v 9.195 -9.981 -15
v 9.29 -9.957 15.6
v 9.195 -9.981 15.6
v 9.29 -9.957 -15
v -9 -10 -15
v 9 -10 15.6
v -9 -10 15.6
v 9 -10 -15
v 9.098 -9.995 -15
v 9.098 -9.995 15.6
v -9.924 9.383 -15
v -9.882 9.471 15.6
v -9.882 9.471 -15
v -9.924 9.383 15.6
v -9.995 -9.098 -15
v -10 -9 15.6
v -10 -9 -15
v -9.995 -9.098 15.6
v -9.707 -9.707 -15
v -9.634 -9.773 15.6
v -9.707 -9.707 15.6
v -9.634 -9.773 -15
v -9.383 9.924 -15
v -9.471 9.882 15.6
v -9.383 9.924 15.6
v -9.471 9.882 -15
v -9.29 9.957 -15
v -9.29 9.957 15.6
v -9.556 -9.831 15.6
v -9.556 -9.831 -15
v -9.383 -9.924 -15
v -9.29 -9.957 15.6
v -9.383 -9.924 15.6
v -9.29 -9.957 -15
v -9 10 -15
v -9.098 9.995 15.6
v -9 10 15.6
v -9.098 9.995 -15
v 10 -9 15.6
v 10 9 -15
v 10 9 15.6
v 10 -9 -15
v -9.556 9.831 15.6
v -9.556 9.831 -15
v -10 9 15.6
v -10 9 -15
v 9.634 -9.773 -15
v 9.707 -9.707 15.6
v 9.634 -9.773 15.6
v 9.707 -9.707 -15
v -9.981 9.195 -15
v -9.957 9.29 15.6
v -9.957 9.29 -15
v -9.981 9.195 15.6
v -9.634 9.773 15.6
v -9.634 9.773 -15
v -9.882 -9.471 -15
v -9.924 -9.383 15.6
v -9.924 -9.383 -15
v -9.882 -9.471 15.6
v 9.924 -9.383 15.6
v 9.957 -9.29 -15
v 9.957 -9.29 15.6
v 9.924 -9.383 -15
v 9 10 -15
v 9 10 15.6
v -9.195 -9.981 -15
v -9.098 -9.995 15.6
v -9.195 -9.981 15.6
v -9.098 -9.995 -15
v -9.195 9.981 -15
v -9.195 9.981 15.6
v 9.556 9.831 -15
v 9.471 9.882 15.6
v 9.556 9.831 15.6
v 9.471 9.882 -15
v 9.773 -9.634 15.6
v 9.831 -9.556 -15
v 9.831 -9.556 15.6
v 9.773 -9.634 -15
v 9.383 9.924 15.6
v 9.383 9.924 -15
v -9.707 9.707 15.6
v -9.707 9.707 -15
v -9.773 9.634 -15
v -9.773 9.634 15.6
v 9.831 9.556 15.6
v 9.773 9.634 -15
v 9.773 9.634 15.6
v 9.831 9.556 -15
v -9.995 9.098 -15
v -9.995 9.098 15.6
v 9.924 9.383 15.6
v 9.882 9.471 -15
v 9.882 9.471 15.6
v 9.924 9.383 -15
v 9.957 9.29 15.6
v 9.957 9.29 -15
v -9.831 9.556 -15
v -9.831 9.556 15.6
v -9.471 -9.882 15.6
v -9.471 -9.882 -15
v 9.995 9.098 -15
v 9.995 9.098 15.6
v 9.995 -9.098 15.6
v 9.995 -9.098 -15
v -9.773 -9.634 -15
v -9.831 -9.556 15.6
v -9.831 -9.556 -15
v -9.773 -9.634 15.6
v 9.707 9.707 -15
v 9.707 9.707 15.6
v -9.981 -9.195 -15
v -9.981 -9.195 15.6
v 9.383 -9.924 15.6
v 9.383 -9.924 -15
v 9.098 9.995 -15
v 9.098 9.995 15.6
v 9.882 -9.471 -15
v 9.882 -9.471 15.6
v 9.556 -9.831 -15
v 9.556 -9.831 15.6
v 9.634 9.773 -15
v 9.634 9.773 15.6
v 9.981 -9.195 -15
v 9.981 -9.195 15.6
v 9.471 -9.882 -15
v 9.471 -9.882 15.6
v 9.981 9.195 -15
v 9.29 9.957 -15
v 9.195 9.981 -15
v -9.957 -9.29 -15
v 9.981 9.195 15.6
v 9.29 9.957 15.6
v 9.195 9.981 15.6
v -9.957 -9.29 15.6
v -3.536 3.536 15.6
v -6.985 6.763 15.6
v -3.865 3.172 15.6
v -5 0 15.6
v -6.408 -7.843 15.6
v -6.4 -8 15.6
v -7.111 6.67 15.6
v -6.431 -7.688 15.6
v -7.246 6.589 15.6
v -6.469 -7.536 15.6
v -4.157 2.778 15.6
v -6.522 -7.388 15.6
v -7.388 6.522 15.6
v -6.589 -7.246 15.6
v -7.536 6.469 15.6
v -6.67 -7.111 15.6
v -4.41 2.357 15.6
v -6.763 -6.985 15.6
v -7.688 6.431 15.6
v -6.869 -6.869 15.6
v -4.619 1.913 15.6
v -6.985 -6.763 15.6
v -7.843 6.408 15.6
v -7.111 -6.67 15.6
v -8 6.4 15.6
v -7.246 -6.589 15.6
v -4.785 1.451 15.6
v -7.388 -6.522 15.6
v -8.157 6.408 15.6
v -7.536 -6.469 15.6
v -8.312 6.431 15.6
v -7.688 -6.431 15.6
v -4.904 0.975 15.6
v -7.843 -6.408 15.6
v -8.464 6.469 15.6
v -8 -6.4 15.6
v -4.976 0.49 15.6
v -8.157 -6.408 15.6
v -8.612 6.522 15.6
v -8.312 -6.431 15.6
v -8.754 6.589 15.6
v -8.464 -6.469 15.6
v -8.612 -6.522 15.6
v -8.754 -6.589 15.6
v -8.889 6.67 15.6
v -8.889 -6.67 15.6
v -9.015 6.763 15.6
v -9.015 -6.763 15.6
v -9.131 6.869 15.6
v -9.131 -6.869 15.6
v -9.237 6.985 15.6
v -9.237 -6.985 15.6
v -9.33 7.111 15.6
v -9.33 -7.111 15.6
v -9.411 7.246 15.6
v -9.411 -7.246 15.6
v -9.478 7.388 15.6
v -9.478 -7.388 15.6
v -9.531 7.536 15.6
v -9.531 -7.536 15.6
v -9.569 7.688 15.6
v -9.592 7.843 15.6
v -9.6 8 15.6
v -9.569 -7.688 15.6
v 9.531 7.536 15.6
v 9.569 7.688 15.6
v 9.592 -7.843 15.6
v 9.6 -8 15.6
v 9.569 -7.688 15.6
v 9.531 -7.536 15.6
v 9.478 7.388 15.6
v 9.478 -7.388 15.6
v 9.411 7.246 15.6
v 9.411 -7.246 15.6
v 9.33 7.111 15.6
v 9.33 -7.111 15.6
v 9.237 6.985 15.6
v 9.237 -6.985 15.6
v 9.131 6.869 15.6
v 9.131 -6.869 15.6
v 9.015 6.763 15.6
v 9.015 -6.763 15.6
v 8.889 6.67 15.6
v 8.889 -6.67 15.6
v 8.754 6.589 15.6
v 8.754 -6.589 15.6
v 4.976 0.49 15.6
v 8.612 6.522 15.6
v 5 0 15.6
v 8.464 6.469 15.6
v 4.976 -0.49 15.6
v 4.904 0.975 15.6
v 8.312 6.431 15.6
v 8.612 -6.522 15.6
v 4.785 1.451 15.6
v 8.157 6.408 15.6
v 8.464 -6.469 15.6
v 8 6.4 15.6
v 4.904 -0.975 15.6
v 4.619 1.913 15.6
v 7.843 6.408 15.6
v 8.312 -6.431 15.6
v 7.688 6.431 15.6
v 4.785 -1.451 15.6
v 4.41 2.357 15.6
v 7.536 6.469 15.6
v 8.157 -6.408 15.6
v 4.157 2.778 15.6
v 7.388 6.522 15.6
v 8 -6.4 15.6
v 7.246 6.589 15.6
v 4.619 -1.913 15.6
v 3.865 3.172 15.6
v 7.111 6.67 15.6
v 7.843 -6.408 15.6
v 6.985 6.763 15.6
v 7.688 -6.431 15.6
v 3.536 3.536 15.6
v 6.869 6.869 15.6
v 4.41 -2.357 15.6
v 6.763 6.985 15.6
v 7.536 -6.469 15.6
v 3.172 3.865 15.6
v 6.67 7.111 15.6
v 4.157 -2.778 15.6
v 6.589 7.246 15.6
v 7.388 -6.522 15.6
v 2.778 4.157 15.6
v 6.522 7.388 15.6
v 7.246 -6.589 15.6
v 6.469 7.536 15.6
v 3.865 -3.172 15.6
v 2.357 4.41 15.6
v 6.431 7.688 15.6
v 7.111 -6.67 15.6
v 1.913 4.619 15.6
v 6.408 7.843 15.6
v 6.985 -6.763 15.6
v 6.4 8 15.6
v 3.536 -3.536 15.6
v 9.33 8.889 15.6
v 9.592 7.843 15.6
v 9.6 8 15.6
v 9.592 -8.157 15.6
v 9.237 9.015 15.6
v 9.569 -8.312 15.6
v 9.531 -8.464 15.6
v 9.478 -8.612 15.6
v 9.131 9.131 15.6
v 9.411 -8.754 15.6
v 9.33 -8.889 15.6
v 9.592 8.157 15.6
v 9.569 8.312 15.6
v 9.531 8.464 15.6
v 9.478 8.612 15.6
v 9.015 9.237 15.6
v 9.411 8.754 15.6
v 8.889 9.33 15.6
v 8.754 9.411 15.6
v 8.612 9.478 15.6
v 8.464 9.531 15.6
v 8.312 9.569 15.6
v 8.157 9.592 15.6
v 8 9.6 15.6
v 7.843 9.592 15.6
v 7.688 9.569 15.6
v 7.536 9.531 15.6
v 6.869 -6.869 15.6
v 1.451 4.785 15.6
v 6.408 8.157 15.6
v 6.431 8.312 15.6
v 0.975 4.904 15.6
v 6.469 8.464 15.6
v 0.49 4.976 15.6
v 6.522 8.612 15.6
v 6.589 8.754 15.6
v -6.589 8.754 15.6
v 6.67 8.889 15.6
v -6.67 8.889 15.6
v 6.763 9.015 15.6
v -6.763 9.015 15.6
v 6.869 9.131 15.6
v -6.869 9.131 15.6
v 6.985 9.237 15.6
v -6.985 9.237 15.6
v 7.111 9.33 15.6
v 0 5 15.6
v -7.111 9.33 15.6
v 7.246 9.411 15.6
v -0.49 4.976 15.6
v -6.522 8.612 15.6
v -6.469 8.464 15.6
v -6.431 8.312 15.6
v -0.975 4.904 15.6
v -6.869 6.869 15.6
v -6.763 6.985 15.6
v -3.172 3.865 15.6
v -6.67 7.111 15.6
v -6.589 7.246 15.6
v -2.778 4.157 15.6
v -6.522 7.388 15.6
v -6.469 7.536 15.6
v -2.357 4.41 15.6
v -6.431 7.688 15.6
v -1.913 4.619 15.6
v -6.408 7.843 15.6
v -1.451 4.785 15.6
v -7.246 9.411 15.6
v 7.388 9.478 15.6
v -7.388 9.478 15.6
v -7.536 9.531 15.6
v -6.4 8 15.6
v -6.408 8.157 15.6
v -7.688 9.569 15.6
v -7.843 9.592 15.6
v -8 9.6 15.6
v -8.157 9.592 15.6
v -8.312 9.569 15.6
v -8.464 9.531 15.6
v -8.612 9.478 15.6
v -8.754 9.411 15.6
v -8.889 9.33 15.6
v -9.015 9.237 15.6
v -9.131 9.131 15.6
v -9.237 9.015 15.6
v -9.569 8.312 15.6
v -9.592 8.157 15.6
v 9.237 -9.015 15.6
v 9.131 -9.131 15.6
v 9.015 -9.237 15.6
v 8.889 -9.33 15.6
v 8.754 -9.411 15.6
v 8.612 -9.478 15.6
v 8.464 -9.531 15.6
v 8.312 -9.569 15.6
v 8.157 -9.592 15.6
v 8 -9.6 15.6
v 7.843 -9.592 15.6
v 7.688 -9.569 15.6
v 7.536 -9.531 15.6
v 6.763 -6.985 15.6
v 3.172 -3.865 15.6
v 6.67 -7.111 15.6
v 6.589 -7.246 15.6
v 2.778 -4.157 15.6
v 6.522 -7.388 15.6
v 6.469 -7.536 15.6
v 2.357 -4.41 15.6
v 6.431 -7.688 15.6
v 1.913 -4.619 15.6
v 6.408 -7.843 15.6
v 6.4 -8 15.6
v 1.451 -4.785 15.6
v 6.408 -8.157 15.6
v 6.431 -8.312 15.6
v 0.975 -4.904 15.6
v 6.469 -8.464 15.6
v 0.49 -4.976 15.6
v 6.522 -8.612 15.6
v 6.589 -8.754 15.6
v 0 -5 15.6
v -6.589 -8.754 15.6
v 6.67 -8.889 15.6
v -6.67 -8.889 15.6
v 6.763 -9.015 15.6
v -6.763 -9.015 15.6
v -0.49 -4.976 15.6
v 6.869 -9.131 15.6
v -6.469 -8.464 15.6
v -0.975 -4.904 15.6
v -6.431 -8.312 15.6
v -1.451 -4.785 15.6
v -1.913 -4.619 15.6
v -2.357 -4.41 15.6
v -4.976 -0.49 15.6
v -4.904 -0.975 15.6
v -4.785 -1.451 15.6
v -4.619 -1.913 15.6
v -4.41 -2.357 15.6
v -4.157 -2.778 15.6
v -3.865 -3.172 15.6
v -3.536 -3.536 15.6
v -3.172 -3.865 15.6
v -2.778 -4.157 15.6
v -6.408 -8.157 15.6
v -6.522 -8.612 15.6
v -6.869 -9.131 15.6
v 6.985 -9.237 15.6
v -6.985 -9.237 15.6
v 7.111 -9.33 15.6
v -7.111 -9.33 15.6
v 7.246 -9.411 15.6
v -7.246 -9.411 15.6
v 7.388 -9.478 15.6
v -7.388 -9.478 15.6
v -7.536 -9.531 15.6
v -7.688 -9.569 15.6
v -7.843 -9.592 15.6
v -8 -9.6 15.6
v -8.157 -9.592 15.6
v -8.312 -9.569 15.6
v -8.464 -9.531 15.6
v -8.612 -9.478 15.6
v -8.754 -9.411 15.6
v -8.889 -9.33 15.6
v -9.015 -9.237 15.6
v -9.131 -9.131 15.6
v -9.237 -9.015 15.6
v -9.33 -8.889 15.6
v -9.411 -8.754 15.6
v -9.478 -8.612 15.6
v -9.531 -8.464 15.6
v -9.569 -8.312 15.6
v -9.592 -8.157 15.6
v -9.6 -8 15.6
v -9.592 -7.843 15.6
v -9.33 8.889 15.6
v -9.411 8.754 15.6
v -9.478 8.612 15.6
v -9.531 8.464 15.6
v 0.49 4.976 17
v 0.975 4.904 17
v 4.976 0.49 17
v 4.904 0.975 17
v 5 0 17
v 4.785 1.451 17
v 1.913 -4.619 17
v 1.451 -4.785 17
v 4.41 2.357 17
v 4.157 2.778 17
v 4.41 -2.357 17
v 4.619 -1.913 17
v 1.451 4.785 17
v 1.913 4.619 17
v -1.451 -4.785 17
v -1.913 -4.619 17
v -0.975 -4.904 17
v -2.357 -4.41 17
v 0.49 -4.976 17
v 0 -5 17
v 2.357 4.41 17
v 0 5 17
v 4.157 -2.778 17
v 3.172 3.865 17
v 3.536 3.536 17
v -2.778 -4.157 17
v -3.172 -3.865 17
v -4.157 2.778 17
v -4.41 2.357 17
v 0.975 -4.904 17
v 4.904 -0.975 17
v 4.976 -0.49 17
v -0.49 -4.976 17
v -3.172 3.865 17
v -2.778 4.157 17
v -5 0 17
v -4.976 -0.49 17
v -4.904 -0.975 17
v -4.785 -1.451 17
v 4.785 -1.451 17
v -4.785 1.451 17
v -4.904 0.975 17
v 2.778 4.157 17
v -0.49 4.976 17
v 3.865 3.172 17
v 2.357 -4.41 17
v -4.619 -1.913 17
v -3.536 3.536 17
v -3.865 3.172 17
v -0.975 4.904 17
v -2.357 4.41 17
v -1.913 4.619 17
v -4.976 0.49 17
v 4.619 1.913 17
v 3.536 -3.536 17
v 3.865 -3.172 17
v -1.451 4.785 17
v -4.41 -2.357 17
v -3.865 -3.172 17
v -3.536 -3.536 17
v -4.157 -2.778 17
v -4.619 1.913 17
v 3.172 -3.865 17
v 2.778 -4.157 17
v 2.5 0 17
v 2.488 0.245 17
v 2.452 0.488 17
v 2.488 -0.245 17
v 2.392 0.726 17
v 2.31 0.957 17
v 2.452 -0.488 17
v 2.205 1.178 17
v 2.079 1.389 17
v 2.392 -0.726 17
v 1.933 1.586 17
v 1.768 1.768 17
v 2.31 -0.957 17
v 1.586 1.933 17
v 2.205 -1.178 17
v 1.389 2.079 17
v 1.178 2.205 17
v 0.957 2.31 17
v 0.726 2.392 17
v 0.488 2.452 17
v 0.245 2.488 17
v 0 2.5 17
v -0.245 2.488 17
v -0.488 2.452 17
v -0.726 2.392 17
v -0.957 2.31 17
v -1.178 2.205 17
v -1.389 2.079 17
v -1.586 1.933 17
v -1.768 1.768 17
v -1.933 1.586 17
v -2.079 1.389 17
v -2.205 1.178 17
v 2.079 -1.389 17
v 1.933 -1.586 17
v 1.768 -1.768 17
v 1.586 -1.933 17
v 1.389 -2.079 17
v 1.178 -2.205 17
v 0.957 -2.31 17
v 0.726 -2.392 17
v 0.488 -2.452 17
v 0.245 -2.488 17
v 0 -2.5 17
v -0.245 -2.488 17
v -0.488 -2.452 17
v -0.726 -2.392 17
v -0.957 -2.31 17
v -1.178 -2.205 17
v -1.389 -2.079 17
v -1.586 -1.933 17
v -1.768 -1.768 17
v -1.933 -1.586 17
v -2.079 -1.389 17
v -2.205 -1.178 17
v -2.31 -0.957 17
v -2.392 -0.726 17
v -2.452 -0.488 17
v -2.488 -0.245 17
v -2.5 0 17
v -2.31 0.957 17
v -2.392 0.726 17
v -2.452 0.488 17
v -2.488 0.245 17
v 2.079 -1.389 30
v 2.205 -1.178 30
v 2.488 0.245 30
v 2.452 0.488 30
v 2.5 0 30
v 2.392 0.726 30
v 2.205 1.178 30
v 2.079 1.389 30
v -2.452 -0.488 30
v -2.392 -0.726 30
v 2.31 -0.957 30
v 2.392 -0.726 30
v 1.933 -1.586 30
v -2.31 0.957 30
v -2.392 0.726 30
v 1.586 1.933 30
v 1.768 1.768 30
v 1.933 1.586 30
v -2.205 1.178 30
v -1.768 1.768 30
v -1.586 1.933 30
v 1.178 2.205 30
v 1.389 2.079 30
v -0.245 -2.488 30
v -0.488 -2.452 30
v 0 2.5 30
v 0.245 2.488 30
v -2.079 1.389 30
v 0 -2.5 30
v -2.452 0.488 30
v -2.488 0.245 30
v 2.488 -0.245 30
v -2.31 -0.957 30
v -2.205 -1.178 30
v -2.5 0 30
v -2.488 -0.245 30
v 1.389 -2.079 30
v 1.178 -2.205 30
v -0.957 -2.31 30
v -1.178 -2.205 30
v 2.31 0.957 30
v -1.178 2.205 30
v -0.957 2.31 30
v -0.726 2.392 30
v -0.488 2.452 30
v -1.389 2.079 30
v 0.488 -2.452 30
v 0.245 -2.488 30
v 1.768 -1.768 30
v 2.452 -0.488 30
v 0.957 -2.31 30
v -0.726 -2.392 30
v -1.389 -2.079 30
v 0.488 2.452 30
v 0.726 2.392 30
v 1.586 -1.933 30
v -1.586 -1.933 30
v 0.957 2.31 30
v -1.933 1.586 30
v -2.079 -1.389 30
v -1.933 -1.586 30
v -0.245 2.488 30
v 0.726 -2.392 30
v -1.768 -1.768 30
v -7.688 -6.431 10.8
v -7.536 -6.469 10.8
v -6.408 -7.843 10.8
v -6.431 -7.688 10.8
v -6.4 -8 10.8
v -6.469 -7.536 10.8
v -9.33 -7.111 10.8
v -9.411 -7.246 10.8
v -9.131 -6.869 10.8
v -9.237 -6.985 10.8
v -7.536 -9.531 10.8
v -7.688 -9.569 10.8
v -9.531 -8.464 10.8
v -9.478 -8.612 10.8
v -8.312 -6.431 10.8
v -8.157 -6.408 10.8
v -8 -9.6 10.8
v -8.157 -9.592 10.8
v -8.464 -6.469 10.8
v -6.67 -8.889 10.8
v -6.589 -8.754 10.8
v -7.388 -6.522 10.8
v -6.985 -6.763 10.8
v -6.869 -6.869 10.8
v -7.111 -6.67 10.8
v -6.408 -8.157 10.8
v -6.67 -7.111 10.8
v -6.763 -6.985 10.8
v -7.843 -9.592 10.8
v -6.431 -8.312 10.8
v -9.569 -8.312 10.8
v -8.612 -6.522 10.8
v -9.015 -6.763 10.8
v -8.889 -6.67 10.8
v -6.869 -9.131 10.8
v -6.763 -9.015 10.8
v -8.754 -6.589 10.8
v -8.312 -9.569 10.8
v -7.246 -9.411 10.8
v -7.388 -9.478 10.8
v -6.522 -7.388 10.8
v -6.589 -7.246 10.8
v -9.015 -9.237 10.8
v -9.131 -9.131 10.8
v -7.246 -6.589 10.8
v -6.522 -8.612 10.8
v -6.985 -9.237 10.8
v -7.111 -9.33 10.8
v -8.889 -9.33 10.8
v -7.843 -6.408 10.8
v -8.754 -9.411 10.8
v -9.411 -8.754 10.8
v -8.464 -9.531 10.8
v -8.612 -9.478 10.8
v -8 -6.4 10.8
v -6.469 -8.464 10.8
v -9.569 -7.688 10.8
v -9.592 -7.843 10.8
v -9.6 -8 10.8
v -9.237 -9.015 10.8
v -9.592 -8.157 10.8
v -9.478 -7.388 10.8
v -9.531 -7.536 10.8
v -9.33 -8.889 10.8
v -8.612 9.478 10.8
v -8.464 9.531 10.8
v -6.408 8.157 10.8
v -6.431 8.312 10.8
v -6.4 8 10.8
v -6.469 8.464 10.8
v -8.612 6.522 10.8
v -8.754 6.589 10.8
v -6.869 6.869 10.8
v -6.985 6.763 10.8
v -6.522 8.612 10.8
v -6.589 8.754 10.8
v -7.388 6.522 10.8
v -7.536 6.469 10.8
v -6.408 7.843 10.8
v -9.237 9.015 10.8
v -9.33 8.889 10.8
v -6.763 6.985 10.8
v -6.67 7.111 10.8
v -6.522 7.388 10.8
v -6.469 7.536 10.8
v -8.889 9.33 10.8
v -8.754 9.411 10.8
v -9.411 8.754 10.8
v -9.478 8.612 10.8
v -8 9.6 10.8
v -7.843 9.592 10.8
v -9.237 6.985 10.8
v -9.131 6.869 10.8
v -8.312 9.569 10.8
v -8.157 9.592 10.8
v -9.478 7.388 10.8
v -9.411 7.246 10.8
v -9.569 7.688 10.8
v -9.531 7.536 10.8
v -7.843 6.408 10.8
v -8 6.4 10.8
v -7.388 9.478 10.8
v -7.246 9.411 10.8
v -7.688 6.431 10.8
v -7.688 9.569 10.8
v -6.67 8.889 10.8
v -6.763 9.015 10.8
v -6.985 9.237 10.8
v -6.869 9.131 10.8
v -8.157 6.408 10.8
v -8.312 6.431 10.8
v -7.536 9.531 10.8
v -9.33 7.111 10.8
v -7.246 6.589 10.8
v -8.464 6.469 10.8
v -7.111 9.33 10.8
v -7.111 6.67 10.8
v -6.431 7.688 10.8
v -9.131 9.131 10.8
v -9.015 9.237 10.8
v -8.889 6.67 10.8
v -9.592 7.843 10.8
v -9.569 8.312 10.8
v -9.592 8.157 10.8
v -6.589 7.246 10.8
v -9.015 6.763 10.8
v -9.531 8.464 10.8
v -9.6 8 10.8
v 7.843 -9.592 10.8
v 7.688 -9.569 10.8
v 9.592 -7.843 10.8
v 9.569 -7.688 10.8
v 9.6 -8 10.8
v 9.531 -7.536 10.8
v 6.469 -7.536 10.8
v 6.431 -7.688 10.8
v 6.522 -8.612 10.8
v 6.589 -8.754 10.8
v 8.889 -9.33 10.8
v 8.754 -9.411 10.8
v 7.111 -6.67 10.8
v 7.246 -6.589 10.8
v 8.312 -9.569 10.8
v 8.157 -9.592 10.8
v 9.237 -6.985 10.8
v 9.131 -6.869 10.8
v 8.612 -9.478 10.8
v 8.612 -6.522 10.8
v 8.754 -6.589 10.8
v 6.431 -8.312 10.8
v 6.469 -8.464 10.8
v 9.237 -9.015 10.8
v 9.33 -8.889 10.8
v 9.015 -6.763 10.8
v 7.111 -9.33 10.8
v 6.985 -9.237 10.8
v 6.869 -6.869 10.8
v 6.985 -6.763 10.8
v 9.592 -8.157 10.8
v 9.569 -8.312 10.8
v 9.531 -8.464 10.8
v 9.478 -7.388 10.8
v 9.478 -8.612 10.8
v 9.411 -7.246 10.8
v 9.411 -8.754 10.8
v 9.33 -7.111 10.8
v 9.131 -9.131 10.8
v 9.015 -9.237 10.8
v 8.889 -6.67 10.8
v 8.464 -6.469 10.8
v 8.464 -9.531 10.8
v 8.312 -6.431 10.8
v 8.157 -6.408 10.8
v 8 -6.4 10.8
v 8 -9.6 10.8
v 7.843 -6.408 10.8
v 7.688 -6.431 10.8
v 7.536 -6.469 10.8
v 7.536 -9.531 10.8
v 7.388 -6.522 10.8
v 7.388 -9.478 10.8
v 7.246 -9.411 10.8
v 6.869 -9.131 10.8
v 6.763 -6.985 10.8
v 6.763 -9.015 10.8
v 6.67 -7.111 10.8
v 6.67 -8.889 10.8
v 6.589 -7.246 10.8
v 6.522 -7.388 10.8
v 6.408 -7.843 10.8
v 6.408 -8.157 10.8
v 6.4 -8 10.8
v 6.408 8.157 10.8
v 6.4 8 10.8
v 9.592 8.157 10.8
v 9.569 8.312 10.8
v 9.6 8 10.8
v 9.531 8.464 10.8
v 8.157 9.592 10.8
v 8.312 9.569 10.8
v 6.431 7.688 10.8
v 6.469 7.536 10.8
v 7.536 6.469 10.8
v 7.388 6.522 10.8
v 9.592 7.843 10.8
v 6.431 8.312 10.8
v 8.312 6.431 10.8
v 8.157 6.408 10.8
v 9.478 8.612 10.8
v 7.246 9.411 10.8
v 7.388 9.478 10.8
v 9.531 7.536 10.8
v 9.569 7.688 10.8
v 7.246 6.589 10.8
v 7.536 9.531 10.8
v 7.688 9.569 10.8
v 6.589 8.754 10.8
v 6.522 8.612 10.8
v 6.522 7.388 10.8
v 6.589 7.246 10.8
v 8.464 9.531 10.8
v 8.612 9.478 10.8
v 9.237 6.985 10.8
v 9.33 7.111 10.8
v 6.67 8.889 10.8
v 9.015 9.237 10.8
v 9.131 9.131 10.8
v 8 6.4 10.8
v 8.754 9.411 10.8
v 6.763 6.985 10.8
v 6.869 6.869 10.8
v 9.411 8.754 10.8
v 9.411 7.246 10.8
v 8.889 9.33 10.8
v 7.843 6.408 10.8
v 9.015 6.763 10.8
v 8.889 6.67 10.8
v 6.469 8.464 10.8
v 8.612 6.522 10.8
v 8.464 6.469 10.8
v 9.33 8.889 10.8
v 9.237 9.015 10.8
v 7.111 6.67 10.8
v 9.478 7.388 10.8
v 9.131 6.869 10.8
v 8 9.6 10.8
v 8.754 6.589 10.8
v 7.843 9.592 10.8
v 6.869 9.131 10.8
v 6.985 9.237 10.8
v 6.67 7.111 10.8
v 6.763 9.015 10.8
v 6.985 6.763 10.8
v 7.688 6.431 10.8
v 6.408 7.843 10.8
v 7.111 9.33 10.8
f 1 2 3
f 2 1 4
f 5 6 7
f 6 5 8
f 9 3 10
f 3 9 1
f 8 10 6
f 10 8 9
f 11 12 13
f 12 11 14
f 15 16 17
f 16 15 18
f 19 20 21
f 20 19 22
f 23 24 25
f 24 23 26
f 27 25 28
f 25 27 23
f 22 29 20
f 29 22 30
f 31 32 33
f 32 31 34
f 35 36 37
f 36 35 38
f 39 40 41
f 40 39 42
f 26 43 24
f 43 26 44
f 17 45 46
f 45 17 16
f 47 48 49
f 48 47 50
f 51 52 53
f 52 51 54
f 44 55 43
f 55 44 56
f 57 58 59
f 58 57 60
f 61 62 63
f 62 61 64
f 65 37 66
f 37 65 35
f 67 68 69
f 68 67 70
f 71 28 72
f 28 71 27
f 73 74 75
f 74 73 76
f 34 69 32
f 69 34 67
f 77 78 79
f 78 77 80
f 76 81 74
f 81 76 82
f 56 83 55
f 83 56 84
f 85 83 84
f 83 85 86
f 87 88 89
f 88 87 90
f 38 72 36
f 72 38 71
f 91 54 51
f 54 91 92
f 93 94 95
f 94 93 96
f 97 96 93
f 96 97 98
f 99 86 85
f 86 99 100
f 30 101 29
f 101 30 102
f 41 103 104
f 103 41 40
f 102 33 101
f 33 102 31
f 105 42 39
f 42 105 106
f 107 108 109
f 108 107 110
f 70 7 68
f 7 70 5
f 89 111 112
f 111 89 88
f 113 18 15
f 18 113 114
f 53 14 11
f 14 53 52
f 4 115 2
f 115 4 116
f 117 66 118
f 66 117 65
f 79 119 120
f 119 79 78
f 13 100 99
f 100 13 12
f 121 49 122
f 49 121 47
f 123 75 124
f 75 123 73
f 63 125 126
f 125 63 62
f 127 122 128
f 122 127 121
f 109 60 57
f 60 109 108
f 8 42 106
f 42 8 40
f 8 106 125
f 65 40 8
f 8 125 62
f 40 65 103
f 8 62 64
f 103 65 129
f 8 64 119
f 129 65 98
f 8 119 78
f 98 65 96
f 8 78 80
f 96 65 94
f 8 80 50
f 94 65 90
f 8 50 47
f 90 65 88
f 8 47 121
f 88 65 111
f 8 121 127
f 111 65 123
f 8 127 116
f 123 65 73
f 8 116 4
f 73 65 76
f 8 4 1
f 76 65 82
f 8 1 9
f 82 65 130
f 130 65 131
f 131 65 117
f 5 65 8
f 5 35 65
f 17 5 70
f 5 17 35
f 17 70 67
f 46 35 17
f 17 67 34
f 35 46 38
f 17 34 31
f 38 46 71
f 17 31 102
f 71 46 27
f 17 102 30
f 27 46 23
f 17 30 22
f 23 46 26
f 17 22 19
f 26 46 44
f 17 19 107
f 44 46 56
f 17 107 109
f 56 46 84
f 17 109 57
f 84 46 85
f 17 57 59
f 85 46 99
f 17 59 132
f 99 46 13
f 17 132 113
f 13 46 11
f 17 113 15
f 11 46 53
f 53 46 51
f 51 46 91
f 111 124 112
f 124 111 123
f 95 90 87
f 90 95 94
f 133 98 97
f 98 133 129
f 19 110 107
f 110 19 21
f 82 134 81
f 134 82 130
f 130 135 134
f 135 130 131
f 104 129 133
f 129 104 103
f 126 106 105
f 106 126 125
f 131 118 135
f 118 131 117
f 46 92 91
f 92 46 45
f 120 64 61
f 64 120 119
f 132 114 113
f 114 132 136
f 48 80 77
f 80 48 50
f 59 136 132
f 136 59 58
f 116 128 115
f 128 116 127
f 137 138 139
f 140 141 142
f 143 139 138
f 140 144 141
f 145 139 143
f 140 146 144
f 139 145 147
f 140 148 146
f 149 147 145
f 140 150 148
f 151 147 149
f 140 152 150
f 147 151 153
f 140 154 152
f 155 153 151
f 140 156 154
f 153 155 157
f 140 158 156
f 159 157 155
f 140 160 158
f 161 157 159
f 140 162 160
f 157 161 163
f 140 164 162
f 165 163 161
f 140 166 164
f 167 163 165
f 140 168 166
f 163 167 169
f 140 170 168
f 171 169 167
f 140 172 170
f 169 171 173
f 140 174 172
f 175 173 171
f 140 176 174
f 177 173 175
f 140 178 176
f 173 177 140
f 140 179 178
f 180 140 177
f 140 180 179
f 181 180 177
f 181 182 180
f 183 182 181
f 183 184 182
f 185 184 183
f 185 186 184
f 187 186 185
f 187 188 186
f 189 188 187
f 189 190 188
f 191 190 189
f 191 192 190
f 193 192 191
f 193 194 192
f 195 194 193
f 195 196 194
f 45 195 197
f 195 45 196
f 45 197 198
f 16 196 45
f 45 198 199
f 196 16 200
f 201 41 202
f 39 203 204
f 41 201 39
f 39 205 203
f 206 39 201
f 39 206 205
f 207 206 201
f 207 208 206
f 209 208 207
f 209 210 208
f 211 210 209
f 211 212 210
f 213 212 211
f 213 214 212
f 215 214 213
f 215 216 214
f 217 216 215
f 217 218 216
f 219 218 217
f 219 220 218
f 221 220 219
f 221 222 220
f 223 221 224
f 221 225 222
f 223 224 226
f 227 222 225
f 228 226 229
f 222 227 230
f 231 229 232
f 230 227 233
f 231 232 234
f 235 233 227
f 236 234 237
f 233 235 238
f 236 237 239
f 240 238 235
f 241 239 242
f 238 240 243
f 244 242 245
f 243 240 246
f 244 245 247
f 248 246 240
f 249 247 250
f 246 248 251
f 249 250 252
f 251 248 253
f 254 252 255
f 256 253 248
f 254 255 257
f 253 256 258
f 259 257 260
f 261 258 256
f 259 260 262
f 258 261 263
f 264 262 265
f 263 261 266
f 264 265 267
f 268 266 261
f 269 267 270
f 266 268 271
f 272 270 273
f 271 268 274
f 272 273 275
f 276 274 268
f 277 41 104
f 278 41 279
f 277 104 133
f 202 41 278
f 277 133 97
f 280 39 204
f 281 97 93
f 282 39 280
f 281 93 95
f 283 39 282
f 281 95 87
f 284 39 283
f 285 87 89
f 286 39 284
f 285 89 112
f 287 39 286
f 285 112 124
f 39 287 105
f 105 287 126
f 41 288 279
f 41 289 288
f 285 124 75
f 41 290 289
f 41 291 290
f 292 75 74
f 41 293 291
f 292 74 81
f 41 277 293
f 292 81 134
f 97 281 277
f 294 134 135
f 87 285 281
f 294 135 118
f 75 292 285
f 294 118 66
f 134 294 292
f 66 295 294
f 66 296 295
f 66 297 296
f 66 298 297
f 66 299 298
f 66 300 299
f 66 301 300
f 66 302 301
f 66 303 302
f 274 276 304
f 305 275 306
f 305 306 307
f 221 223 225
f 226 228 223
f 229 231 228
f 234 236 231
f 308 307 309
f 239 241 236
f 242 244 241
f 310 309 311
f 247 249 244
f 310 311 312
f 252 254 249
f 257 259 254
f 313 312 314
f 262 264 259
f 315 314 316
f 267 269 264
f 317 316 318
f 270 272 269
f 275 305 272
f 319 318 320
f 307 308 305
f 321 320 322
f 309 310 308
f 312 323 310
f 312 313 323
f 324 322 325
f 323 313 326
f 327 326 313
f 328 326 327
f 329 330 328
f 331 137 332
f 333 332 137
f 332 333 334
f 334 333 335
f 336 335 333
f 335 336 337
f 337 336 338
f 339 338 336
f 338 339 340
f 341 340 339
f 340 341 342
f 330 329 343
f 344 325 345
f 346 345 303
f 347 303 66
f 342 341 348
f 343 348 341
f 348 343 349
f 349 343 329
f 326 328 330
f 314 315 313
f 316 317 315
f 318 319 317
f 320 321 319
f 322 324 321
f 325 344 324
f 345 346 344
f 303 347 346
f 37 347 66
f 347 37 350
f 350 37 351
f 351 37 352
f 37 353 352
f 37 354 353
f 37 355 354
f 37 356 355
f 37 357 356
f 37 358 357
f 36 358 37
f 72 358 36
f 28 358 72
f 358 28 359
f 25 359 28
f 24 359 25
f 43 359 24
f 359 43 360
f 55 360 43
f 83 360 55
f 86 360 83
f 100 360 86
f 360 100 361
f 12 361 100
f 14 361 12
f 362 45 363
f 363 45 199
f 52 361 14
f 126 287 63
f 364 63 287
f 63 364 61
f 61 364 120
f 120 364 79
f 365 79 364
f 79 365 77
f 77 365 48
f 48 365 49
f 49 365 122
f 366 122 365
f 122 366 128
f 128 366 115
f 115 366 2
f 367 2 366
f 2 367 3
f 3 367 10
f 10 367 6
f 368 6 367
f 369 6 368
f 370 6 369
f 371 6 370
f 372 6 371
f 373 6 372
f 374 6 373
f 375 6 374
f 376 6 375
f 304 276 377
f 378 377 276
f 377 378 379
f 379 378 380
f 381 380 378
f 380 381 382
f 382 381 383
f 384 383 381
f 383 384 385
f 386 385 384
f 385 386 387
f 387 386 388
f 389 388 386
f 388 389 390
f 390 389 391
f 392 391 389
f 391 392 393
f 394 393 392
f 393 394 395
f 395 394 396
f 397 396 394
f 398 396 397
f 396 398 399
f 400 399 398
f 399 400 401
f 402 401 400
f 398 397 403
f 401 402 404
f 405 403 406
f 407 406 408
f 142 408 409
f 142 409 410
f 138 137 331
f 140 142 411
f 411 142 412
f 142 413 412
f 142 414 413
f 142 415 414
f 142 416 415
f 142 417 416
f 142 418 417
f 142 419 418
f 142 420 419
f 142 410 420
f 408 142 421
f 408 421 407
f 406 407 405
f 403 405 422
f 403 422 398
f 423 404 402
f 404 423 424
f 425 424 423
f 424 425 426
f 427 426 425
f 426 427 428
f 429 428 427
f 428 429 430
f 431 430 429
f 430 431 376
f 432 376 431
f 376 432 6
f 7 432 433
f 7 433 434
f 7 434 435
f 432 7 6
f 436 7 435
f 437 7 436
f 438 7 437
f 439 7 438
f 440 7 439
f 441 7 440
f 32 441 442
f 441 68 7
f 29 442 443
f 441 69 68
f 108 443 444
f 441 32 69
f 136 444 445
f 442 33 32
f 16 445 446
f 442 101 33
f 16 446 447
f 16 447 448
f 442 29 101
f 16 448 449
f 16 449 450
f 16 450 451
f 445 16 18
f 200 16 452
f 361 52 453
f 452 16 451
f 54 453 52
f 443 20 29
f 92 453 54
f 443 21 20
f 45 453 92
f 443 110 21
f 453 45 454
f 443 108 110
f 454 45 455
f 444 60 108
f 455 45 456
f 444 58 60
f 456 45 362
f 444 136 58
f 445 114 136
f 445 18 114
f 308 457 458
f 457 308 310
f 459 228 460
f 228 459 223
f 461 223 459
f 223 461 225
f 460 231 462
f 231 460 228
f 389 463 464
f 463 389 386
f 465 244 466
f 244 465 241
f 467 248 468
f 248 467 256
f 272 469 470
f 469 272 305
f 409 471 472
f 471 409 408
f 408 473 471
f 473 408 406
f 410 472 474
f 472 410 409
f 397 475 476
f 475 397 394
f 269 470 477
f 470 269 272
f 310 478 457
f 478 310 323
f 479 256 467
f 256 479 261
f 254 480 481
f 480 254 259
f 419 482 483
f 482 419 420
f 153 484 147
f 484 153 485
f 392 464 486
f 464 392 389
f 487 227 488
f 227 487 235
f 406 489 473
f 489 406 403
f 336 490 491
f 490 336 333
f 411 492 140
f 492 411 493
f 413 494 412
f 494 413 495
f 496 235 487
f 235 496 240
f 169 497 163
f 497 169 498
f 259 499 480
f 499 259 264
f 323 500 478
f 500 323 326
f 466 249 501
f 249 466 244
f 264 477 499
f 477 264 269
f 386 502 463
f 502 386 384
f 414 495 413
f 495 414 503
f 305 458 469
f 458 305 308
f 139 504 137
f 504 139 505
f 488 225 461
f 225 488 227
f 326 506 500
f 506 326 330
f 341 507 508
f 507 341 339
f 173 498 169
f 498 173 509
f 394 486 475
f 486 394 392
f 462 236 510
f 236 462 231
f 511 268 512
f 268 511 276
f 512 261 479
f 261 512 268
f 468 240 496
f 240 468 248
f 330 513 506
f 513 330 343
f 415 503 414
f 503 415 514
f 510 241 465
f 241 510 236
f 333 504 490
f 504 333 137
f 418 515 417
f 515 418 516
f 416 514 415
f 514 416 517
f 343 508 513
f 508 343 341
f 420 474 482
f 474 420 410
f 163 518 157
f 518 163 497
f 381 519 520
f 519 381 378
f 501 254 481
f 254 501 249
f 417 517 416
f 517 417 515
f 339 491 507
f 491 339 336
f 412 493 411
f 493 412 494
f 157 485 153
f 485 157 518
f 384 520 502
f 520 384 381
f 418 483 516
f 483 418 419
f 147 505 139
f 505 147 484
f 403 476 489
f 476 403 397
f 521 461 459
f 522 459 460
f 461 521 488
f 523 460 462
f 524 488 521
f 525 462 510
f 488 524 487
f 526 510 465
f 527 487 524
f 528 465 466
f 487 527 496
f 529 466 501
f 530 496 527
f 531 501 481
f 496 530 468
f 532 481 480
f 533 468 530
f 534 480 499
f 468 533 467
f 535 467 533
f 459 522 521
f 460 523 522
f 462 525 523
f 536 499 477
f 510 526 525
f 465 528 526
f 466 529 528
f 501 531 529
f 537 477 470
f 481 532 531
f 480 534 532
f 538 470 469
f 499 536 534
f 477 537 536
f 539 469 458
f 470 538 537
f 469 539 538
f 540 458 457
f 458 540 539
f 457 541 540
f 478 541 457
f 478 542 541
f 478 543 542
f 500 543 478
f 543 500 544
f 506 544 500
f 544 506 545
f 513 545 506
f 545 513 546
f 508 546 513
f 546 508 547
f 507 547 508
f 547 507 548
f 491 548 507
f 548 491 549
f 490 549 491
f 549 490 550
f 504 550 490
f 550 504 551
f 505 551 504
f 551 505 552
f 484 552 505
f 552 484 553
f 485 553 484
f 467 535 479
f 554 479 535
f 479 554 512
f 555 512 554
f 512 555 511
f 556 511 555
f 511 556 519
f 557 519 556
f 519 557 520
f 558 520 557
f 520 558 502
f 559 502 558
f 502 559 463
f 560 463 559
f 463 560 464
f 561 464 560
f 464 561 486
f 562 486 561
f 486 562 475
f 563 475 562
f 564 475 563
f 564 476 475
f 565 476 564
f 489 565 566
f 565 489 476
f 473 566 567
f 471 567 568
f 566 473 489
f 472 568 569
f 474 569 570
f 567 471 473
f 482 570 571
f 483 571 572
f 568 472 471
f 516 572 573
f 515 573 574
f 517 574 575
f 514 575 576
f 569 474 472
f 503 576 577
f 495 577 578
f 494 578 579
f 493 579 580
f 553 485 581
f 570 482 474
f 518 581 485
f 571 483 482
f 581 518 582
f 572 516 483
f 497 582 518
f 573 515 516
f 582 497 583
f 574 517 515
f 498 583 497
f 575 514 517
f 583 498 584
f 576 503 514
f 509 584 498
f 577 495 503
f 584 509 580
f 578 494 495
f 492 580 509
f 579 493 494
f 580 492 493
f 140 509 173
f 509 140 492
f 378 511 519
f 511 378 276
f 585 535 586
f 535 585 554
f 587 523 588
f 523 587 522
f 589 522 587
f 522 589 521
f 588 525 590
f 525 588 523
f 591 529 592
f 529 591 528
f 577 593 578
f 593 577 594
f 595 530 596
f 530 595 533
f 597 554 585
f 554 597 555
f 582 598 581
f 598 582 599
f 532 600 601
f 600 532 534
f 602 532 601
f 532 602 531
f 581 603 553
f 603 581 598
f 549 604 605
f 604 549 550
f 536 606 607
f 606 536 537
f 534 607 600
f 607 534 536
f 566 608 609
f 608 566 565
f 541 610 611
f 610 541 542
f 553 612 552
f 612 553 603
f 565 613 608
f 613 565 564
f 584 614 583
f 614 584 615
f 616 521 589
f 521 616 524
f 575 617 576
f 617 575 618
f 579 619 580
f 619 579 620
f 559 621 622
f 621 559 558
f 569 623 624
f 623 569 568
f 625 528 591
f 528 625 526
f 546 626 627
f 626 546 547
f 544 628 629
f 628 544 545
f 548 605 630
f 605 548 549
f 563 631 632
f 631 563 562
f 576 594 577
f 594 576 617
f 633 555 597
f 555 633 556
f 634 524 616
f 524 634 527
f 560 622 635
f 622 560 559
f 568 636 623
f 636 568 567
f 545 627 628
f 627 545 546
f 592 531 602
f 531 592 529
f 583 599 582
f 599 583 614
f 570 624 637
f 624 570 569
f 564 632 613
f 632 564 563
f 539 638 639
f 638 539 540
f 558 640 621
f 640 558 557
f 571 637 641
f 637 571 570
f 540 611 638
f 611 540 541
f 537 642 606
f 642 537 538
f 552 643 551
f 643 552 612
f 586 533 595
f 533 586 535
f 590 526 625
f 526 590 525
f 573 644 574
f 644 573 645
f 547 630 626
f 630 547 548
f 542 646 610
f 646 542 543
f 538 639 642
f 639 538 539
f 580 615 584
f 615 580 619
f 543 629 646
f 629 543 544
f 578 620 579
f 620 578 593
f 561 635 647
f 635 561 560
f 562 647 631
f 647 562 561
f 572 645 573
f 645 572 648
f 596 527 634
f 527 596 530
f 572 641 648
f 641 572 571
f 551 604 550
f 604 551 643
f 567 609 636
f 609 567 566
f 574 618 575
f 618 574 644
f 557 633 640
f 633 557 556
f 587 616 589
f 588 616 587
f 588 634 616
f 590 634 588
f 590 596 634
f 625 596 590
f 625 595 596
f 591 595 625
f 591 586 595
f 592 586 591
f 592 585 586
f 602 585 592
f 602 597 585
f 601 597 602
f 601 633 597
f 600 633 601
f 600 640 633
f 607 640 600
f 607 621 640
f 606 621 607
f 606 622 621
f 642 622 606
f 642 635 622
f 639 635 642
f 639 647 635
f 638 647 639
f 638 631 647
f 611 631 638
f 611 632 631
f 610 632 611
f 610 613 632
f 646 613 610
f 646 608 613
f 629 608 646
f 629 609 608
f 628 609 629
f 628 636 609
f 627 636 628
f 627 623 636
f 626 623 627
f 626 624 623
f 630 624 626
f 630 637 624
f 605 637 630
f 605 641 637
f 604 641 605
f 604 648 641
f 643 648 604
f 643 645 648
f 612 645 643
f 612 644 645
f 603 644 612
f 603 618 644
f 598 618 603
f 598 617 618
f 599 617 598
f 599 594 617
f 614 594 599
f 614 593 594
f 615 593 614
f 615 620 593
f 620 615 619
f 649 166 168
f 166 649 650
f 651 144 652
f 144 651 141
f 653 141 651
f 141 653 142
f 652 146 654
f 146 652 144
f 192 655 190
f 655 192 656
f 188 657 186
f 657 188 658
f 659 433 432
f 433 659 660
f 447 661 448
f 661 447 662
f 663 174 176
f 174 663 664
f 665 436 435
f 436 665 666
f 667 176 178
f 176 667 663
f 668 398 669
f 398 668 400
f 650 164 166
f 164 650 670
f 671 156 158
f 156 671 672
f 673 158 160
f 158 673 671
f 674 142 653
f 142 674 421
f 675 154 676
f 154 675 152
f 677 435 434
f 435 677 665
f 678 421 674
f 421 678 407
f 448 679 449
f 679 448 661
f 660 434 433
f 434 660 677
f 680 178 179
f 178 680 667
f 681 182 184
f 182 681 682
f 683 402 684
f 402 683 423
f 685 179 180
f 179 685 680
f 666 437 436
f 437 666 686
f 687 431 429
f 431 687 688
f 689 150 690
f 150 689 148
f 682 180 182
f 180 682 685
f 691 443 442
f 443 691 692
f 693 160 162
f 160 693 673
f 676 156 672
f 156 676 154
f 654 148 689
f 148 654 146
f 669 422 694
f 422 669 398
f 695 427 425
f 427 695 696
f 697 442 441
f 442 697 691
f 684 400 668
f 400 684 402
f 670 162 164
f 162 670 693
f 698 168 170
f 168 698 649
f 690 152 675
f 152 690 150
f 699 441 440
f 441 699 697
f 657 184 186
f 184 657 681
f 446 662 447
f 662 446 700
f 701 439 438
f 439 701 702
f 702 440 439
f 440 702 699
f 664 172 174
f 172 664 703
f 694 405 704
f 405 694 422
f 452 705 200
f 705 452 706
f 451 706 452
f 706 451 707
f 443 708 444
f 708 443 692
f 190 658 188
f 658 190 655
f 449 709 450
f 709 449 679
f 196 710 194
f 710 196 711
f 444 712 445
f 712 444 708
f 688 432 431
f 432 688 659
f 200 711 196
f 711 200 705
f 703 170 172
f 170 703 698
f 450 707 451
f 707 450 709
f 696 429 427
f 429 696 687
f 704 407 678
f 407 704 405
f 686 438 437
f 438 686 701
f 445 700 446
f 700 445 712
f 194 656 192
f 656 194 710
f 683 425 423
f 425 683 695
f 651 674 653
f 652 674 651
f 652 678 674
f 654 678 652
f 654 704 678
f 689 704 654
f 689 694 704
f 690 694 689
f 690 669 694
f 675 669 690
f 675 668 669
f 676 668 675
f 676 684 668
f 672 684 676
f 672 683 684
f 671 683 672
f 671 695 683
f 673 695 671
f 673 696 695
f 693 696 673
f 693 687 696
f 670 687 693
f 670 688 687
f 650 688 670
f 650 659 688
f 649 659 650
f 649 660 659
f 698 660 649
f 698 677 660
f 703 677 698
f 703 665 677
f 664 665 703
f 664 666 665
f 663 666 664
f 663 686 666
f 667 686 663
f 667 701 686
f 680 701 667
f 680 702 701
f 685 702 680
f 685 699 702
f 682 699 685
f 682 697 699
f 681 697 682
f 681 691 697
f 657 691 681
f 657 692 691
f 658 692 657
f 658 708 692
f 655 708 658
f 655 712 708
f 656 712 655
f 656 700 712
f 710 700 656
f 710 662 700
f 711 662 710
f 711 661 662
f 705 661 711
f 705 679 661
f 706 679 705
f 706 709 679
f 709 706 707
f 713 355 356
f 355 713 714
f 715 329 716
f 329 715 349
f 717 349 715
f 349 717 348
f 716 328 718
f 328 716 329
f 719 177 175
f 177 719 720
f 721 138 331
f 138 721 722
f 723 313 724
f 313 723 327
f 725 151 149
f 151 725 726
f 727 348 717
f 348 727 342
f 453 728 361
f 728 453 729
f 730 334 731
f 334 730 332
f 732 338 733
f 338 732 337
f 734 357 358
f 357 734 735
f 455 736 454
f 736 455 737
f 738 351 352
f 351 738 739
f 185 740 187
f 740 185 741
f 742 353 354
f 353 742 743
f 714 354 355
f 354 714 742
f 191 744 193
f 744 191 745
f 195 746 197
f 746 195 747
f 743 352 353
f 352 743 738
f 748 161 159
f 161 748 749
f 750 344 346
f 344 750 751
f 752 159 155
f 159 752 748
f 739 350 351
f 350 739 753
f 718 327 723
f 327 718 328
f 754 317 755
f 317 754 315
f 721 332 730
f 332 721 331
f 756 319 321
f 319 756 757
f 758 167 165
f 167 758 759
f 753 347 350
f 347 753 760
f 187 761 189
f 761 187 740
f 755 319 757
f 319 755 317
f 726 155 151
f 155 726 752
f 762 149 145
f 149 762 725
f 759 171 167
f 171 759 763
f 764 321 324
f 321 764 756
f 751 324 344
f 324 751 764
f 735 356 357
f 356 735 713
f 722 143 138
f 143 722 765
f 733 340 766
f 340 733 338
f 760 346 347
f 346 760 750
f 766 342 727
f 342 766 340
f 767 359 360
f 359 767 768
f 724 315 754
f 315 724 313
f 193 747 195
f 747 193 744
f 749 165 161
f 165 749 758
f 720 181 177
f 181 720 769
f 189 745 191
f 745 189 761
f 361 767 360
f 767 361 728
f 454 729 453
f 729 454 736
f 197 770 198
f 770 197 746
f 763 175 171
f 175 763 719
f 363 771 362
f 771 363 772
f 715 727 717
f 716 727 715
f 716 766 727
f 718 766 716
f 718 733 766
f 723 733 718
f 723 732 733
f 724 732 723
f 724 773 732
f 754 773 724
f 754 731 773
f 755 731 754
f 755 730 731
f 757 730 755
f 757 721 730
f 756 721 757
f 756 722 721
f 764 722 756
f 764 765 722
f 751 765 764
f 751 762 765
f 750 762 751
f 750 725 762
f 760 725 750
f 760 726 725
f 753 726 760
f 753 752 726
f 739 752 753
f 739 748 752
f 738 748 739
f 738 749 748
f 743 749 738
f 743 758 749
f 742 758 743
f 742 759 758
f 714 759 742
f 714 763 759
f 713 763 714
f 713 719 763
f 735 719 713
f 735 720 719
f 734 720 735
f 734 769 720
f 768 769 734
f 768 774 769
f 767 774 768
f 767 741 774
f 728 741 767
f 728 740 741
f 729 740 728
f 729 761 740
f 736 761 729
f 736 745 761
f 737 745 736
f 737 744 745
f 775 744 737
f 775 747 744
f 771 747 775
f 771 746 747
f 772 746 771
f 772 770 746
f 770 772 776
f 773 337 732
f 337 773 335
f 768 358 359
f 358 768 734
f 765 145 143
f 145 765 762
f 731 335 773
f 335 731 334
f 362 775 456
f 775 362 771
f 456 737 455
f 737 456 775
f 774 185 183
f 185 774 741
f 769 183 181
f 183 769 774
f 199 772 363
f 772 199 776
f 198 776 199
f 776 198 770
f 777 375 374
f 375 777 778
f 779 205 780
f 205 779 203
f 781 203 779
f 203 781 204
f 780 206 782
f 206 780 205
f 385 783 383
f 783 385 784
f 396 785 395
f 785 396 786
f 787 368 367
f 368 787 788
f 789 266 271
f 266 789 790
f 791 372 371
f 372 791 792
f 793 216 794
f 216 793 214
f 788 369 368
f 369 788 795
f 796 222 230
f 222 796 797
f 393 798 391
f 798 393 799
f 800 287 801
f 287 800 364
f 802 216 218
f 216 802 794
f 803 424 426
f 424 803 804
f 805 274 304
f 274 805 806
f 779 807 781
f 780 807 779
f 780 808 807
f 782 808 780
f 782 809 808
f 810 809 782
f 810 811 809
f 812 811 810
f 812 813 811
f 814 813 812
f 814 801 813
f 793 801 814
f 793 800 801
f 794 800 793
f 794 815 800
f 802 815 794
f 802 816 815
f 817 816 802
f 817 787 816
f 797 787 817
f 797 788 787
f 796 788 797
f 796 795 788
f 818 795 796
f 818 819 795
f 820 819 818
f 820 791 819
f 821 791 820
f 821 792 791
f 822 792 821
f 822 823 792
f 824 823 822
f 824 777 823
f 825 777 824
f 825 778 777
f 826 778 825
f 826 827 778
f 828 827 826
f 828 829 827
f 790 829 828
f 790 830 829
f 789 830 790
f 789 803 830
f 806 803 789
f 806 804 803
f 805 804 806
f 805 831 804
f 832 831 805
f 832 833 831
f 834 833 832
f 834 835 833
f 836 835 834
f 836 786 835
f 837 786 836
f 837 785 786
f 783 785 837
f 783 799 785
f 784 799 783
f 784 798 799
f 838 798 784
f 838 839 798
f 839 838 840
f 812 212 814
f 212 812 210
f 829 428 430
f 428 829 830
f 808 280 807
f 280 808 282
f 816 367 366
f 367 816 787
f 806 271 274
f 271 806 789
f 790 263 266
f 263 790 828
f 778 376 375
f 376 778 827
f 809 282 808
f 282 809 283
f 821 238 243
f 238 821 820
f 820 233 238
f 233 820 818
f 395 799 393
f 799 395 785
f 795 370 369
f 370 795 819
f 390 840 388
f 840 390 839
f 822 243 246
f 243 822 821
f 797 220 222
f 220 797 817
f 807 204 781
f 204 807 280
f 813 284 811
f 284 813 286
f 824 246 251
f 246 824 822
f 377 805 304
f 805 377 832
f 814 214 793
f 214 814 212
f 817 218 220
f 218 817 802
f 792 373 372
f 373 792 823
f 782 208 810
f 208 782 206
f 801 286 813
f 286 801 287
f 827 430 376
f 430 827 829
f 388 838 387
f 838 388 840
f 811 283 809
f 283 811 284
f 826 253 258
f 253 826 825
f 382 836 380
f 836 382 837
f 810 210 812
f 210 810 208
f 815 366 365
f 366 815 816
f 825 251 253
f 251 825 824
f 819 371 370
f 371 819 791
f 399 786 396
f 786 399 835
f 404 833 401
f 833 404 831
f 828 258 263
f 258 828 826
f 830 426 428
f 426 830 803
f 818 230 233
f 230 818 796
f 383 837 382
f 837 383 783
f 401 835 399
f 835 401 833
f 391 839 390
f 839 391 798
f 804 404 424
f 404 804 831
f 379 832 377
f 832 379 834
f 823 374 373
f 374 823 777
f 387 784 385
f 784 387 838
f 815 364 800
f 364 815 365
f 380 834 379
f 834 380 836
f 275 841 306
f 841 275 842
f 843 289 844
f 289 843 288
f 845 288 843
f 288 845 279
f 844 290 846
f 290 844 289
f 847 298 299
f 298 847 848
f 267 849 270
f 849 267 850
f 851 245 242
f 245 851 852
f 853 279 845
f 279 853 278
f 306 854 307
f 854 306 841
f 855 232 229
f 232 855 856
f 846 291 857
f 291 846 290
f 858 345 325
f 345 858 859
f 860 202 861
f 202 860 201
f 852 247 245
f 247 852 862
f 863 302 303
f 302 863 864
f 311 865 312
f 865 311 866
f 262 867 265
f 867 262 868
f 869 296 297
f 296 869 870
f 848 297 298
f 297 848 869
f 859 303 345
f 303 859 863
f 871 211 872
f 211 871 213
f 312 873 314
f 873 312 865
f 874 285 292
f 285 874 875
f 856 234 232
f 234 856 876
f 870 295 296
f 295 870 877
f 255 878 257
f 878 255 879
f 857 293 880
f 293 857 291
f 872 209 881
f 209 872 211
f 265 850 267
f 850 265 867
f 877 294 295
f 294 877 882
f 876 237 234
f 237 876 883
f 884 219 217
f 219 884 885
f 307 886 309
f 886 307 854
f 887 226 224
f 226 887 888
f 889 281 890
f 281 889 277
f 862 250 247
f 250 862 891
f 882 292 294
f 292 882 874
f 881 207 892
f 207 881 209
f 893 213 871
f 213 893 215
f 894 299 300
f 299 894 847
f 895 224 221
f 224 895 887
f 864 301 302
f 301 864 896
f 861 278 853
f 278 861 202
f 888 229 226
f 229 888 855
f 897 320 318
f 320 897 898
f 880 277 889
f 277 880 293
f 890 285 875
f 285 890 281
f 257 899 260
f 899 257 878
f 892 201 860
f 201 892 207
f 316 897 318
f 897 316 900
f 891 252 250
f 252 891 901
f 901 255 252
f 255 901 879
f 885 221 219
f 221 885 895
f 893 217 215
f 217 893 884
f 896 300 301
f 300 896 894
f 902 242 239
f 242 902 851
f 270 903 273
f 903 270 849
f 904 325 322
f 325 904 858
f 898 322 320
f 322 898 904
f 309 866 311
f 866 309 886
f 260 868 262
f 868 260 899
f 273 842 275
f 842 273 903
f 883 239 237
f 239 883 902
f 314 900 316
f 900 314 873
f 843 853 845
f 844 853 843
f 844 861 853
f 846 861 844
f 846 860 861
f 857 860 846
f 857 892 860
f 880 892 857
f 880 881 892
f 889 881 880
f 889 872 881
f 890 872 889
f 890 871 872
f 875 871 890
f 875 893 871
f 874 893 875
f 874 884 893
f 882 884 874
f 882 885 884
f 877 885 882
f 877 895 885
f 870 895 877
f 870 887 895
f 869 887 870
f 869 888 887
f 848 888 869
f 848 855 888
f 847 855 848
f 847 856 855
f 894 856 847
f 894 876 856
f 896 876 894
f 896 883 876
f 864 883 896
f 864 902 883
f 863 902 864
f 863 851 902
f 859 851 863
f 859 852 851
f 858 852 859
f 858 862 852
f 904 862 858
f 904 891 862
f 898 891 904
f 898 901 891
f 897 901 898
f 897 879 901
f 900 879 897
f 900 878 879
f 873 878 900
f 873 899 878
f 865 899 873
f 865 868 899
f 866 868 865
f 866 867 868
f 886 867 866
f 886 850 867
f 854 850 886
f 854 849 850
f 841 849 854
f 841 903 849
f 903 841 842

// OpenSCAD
// Stepper motor (NEMA-style) - corrected, single connected solid
// Target: 20.0mm face width, 30.0mm body length, 5.0mm shaft diameter, 16.0mm mounting hole spacing

$fn = 64;

// Parameters
face_width_mm = 20.0;                 // square face width
body_length_mm = 30.0;                // motor body length (Z)
face_thickness_mm = 3.0;              // front faceplate thickness
shaft_diameter_mm = 5.0;              // shaft diameter
shaft_length_mm = 15.0;               // shaft length protruding from face
mount_hole_spacing_mm = 16.0;         // center-to-center spacing (square pattern)
mount_hole_diameter_mm = 3.2;         // clearance hole
corner_radius_mm = 1.0;               // body edge rounding
pilot_diameter_mm = 10.0;             // front pilot/boss diameter (typical)
pilot_height_mm = 2.0;                // pilot height
overlap_mm = 0.6;                     // small overlap to ensure connectivity / robust booleans

// Rounded box helper (centered)
module rounded_box(size=[20,20,30], r=1.0) {
    r2 = min(r, min(size[0], size[1]) / 2);
    linear_extrude(height=size[2], center=true)
        offset(r=r2)
            square([size[0]-2*r2, size[1]-2*r2], center=true);
}

// Main motor solid (single connected solid)
module stepper_motor() {
    // Coordinate system:
    // Motor body centered at origin, Z axis along motor length.
    // Front face is at +body_length_mm/2.

    front_z = body_length_mm/2;
    face_center_z = front_z - face_thickness_mm/2; // faceplate sits on front of body
    pilot_center_z = front_z + pilot_height_mm/2 - overlap_mm;
    shaft_center_z = front_z + shaft_length_mm/2 - overlap_mm;

    difference() {
        union() {
            // Body (square)
            rounded_box([face_width_mm, face_width_mm, body_length_mm], corner_radius_mm);

            // Front faceplate (slightly larger square, connected with overlap)
            translate([0, 0, face_center_z])
                rounded_box([face_width_mm, face_width_mm, face_thickness_mm + 2*overlap_mm], corner_radius_mm);

            // Front pilot/boss (connected)
            translate([0, 0, pilot_center_z])
                cylinder(d=pilot_diameter_mm, h=pilot_height_mm + 2*overlap_mm, center=true);

            // Shaft (connected)
            translate([0, 0, shaft_center_z])
                cylinder(d=shaft_diameter_mm, h=shaft_length_mm + 2*overlap_mm, center=true);
        }

        // Mounting holes through the faceplate (visible from front)
        // Place holes on a 16mm square pattern: (±8, ±8)
        hole_offset = mount_hole_spacing_mm/2;
        hole_h = face_thickness_mm + 4*overlap_mm;
        for (x = [-hole_offset, hole_offset])
            for (y = [-hole_offset, hole_offset])
                translate([x, y, face_center_z])
                    cylinder(d=mount_hole_diameter_mm, h=hole_h, center=true);
    }
}

stepper_motor();
